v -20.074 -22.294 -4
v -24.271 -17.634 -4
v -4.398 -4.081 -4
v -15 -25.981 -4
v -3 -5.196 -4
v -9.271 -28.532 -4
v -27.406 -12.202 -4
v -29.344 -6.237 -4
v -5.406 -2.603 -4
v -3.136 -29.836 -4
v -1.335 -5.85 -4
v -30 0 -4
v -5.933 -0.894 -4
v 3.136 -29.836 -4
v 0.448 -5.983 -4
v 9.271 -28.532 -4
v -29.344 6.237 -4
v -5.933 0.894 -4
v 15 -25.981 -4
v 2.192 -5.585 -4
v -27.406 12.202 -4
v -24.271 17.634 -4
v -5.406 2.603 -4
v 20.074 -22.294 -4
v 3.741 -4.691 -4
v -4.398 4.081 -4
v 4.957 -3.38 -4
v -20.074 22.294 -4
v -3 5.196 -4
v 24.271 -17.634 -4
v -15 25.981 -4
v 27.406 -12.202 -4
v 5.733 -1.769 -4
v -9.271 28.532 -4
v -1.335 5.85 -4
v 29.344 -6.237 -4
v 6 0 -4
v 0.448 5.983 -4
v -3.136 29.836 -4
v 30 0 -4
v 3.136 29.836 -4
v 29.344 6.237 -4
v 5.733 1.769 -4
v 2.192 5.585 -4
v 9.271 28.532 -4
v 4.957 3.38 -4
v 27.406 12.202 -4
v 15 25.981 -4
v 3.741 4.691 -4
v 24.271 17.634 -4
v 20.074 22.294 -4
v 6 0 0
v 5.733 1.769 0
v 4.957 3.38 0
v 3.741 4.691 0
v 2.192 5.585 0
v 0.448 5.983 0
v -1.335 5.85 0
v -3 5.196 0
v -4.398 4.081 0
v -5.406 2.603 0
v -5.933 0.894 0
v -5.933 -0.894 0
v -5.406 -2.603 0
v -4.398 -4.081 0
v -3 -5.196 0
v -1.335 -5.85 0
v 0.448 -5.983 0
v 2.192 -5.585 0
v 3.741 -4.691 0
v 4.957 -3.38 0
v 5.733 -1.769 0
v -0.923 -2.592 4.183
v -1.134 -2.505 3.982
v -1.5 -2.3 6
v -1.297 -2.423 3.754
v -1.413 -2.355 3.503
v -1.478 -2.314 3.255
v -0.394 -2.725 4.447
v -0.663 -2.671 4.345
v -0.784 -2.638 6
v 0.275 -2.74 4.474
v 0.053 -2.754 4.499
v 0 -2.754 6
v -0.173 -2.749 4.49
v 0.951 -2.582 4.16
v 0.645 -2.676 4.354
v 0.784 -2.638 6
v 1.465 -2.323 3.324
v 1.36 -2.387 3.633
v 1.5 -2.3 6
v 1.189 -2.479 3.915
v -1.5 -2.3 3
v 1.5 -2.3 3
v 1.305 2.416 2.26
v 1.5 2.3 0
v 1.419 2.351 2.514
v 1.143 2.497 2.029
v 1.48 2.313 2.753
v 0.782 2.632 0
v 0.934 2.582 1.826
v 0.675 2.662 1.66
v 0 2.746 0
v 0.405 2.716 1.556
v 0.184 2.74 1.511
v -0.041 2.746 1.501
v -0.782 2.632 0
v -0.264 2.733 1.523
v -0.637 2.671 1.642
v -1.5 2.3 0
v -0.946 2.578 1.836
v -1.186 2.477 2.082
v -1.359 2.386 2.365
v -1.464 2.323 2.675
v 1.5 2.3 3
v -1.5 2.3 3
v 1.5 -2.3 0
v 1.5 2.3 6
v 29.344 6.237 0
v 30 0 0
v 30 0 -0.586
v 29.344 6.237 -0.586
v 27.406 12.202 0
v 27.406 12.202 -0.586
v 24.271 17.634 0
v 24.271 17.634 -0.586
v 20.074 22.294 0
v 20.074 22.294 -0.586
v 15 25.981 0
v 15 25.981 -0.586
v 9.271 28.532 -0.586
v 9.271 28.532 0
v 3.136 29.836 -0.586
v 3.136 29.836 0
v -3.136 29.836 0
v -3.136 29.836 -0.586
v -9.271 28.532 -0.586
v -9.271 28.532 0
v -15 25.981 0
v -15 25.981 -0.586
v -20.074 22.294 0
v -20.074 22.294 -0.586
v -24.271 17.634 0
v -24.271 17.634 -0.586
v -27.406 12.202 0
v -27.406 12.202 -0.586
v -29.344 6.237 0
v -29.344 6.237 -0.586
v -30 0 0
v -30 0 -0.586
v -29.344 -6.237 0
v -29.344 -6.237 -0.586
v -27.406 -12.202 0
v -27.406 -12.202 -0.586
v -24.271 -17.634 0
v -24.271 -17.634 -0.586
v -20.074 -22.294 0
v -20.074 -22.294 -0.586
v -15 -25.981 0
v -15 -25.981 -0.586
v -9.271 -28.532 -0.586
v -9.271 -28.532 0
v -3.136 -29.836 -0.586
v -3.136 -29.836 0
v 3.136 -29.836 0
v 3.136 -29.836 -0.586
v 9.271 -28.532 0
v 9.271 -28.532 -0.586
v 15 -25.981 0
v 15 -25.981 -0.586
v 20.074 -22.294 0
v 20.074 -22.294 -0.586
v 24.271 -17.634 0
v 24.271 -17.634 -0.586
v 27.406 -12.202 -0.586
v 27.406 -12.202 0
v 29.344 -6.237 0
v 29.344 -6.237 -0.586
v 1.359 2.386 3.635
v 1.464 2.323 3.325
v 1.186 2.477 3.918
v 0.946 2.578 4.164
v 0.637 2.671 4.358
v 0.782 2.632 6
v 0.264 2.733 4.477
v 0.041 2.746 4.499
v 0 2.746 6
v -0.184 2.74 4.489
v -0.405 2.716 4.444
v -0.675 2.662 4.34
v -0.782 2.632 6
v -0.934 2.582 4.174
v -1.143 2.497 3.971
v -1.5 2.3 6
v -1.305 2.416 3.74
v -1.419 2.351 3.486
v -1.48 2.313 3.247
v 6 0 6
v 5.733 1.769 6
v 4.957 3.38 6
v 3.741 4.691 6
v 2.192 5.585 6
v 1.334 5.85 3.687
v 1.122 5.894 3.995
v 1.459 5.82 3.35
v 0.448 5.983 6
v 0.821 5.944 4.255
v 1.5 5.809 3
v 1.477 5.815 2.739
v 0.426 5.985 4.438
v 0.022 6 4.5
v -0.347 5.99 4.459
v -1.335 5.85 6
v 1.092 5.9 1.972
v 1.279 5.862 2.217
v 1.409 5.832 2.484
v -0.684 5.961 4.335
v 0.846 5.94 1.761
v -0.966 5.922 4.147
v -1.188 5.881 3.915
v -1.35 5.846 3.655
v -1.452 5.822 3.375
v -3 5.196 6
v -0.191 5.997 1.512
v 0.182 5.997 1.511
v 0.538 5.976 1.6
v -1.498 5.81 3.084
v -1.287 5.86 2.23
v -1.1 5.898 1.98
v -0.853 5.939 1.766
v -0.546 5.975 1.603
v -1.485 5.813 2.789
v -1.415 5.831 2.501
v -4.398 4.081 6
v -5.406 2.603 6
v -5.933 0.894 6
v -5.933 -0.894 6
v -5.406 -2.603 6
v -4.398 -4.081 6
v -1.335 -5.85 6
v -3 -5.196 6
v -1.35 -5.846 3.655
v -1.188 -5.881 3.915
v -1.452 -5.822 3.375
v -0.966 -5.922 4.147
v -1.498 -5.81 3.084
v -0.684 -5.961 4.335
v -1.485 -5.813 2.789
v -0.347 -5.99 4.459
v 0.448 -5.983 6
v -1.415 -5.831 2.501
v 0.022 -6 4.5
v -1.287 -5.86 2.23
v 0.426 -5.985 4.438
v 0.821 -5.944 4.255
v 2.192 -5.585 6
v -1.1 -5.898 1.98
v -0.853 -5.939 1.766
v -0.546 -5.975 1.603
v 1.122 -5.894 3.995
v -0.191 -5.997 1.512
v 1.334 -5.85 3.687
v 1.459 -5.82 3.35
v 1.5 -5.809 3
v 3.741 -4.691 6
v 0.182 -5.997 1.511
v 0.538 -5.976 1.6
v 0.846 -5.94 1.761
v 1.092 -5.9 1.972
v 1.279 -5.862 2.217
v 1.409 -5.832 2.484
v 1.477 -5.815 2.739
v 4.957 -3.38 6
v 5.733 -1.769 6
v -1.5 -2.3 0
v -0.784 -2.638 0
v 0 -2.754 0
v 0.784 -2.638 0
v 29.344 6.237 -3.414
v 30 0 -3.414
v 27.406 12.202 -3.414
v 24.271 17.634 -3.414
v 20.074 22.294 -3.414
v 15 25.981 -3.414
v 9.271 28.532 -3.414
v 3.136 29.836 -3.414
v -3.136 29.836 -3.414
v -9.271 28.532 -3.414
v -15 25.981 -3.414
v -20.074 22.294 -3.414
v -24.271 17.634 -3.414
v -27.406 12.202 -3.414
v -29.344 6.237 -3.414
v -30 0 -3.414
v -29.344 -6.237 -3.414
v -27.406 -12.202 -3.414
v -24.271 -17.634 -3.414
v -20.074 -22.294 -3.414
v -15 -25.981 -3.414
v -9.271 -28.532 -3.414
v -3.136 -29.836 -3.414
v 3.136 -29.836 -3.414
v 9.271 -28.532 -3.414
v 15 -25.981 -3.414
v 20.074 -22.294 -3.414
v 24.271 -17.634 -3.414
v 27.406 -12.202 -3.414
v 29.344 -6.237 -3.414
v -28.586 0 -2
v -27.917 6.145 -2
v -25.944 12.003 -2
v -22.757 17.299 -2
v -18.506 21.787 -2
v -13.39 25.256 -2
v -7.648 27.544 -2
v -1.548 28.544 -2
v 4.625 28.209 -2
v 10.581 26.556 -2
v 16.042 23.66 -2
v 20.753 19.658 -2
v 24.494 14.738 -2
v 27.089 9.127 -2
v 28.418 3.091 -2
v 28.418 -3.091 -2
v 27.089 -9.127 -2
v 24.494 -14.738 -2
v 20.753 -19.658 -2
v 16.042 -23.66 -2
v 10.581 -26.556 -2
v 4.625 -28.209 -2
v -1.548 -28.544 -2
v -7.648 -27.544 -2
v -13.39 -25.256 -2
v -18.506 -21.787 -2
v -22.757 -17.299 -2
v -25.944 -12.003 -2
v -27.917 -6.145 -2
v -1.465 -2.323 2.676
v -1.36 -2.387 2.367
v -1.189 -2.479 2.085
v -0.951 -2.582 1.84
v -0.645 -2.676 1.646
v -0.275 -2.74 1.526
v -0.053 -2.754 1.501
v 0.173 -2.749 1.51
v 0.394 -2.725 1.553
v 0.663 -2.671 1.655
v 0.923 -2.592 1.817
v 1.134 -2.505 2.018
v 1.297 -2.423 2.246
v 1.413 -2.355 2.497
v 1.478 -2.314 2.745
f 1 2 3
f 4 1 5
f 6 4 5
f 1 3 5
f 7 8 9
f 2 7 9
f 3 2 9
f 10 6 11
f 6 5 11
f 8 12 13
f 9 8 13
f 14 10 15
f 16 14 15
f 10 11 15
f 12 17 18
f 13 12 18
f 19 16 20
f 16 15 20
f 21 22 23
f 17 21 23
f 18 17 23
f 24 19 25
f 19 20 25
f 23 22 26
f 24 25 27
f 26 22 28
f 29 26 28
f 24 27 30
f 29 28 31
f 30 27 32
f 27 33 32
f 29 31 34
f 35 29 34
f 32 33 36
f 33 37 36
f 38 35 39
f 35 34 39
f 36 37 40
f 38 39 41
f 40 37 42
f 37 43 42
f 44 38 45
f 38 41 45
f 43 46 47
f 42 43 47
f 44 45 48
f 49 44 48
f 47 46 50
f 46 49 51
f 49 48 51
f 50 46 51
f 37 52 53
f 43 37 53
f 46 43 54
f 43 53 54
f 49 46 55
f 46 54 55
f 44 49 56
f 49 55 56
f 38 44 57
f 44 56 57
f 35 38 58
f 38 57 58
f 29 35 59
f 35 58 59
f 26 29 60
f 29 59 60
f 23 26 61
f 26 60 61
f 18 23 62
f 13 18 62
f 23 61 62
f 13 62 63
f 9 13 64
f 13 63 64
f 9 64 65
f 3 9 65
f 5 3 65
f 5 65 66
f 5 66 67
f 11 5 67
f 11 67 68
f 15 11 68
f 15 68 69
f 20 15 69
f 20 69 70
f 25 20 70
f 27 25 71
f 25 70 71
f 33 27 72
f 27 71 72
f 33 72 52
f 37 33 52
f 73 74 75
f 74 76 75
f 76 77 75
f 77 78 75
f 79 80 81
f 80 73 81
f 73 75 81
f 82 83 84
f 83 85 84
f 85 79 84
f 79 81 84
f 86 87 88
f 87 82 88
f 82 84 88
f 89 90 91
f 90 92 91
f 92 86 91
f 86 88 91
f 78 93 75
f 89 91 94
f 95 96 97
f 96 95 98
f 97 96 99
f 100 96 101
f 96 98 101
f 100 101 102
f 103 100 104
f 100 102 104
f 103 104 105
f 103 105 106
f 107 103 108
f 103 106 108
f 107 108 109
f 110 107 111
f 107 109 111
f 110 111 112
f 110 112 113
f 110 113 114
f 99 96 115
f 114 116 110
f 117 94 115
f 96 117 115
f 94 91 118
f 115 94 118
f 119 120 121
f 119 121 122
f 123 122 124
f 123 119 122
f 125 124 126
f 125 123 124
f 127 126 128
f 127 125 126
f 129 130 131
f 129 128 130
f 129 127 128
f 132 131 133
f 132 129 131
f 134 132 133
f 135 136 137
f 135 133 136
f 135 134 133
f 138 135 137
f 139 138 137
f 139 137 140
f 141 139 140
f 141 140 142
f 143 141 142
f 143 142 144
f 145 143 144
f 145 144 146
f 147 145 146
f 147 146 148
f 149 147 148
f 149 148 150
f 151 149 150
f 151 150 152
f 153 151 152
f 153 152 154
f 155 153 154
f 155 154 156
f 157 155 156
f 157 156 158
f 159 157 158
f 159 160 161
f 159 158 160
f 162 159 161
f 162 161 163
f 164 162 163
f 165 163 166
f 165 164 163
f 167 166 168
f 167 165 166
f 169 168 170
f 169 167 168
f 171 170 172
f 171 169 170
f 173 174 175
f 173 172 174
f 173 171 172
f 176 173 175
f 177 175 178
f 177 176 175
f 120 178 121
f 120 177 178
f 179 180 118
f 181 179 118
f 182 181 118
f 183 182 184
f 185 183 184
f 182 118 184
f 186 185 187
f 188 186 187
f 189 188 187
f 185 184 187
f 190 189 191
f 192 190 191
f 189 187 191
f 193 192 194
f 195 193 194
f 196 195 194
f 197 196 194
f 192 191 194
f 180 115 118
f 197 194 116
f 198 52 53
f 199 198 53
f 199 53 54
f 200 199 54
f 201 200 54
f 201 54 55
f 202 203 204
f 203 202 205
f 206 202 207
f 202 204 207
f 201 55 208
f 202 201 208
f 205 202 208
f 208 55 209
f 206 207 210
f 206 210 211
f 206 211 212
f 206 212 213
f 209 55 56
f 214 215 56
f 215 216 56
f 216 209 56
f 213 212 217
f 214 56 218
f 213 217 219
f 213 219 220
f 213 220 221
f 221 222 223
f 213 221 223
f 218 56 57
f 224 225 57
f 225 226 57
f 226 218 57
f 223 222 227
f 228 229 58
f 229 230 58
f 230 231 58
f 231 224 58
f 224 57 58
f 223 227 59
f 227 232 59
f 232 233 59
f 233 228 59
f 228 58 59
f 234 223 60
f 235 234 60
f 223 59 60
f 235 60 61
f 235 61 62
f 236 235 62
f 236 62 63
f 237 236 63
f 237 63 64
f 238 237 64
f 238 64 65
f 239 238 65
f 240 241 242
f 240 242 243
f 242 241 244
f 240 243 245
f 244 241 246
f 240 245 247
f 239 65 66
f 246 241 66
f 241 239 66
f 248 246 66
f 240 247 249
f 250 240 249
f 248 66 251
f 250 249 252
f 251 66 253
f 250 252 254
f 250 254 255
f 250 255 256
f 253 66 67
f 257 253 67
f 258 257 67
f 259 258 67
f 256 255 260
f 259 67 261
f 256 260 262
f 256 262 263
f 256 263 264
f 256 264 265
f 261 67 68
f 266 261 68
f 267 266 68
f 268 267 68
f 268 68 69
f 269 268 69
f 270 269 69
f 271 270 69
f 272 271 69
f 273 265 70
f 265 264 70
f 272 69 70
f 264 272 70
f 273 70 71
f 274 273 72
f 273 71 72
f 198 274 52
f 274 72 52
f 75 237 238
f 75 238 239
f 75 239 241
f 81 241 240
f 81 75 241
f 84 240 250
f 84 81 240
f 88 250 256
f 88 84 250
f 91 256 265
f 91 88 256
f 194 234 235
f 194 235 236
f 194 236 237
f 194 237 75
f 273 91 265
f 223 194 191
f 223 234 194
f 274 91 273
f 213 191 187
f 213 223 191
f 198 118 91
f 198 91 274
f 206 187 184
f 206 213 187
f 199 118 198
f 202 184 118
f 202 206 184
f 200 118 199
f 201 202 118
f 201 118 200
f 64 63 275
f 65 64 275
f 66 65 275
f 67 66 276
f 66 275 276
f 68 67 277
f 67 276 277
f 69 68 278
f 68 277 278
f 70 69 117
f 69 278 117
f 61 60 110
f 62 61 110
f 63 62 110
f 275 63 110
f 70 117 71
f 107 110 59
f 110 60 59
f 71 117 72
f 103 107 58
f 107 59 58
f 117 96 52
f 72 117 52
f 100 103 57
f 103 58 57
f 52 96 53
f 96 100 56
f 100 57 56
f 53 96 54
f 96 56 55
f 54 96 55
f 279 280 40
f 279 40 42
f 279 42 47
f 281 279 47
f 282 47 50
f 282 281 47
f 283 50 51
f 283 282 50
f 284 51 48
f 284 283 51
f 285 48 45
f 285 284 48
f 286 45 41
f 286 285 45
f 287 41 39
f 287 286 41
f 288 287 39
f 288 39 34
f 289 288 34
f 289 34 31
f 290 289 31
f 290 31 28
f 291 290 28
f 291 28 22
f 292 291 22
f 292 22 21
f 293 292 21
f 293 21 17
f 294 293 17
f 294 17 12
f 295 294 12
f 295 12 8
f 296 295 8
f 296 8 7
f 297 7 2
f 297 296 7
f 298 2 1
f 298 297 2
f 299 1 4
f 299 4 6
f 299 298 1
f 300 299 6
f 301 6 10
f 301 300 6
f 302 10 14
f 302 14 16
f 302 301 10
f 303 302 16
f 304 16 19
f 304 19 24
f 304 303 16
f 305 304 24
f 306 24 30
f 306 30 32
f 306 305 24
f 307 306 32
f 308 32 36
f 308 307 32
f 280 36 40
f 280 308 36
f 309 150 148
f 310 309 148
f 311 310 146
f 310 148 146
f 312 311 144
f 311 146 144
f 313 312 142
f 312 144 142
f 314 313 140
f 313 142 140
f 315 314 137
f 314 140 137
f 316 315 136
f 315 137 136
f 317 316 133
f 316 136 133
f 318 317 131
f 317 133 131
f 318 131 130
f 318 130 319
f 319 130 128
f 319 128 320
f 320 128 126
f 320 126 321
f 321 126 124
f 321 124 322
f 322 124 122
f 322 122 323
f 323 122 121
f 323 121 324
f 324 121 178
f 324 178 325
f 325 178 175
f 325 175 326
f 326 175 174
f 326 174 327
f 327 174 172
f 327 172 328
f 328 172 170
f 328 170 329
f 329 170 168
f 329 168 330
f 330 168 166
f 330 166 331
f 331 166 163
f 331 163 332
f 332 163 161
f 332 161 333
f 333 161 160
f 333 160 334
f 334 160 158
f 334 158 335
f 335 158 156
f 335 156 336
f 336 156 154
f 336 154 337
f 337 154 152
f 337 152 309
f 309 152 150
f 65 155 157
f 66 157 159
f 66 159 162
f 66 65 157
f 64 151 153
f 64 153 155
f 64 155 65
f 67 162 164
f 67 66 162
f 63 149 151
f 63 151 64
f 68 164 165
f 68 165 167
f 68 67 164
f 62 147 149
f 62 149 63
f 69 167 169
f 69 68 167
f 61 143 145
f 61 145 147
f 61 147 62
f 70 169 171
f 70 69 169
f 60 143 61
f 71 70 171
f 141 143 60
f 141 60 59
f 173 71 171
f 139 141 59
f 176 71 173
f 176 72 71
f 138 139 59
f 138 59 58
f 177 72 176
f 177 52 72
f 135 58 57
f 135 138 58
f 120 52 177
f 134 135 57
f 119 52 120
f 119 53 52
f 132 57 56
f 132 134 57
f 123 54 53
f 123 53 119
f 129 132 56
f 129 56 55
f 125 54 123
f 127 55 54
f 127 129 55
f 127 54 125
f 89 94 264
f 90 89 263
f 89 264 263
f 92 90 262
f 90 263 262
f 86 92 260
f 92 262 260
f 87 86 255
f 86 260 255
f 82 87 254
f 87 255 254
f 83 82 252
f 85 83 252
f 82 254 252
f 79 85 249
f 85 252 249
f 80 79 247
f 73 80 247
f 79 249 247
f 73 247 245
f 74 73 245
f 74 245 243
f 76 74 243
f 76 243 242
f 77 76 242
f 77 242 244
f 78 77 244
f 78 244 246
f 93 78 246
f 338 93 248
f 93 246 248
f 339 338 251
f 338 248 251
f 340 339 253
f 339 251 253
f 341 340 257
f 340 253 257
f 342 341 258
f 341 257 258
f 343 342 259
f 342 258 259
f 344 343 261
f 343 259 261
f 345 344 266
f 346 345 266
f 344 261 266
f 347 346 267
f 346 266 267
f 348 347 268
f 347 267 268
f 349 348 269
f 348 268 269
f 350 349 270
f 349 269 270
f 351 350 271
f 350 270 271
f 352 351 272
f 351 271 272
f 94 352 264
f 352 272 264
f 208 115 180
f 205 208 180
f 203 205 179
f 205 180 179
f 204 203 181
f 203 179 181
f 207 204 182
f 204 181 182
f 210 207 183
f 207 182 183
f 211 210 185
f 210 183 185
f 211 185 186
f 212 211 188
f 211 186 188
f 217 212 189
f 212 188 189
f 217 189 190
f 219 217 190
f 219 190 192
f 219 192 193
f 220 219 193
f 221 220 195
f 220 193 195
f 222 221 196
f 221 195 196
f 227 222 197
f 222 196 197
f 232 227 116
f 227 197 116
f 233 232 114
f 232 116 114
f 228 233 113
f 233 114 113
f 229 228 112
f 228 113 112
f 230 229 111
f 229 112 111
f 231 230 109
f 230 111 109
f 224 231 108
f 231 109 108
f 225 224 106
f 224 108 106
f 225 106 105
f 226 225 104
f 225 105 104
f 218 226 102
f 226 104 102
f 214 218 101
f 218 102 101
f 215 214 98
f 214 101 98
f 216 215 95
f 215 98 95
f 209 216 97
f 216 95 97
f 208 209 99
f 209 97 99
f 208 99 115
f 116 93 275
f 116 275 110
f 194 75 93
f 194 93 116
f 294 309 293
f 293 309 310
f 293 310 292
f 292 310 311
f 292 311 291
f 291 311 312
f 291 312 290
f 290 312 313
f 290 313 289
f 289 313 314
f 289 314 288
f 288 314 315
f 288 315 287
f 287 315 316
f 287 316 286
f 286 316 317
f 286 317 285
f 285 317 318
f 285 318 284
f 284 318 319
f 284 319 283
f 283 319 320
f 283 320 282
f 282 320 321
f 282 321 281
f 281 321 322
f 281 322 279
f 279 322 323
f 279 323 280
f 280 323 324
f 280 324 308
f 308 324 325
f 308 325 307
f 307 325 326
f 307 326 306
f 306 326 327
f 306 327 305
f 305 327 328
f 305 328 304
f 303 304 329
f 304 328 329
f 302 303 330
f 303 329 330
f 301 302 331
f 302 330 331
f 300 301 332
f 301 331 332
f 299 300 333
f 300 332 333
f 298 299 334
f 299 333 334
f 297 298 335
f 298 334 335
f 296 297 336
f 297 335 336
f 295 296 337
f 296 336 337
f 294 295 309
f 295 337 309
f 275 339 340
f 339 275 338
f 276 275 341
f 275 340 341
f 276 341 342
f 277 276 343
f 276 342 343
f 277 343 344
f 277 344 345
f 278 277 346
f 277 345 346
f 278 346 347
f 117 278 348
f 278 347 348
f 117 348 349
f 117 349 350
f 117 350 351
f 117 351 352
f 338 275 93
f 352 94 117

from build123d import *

# Parameters (mm, degrees)
F0_R     = 30
F0_R_2   = 6
F1_DEPTH = 4
F2_DEPTH = 6
F3_R     = 1.5
F4_DEPTH = 12.5
F5_W     = 3
F5_H     = 4.6
F6_DEPTH = 9.4


with BuildPart() as f1:
    # F0 (on Top) → F1 (new body)
    with BuildSketch(Plane.XY):
        Circle(F0_R)
        Circle(F0_R_2, mode=Mode.SUBTRACT)
    extrude(amount=-F1_DEPTH)

    # F7 (on Front) → F8 (revolve, cut)
    with BuildSketch(Plane.XZ):
        Polygon((-30, -0.585786), (-30, -3.414214), (-28.585786, -2), align=None)
    revolve(axis=Axis((0, 0, 1.456971), (0, 0, -1)), mode=Mode.SUBTRACT)


with BuildPart() as f2:
    # F0 (on Top) → F2 (new body)
    with BuildSketch(Plane.XY):
        Circle(F0_R_2)
    extrude(amount=F2_DEPTH)

    # F3 (on Front) → F4 (cut, symmetric)
    with BuildSketch(Plane.XZ):
        with Locations((0, 3)):
            Circle(F3_R)
    extrude(amount=F4_DEPTH, both=True, mode=Mode.SUBTRACT)

    # F5 (on face) → F6 (cut)
    with BuildSketch(Plane.XY.offset(6)):
        Rectangle(F5_W, F5_H)
        with BuildLine():
            Line((1.5, -2.3), (-1.5, -2.3))
            ThreePointArc((-1.5, -2.3), (0, -2.754094), (1.5, -2.3))
        make_face()
        with BuildLine():
            ThreePointArc((1.5, 2.3), (0, 2.745906), (-1.5, 2.3))
            Line((-1.5, 2.3), (1.5, 2.3))
        make_face()
    extrude(amount=-F6_DEPTH, mode=Mode.SUBTRACT)


solid = Compound([f1.part, f2.part])
